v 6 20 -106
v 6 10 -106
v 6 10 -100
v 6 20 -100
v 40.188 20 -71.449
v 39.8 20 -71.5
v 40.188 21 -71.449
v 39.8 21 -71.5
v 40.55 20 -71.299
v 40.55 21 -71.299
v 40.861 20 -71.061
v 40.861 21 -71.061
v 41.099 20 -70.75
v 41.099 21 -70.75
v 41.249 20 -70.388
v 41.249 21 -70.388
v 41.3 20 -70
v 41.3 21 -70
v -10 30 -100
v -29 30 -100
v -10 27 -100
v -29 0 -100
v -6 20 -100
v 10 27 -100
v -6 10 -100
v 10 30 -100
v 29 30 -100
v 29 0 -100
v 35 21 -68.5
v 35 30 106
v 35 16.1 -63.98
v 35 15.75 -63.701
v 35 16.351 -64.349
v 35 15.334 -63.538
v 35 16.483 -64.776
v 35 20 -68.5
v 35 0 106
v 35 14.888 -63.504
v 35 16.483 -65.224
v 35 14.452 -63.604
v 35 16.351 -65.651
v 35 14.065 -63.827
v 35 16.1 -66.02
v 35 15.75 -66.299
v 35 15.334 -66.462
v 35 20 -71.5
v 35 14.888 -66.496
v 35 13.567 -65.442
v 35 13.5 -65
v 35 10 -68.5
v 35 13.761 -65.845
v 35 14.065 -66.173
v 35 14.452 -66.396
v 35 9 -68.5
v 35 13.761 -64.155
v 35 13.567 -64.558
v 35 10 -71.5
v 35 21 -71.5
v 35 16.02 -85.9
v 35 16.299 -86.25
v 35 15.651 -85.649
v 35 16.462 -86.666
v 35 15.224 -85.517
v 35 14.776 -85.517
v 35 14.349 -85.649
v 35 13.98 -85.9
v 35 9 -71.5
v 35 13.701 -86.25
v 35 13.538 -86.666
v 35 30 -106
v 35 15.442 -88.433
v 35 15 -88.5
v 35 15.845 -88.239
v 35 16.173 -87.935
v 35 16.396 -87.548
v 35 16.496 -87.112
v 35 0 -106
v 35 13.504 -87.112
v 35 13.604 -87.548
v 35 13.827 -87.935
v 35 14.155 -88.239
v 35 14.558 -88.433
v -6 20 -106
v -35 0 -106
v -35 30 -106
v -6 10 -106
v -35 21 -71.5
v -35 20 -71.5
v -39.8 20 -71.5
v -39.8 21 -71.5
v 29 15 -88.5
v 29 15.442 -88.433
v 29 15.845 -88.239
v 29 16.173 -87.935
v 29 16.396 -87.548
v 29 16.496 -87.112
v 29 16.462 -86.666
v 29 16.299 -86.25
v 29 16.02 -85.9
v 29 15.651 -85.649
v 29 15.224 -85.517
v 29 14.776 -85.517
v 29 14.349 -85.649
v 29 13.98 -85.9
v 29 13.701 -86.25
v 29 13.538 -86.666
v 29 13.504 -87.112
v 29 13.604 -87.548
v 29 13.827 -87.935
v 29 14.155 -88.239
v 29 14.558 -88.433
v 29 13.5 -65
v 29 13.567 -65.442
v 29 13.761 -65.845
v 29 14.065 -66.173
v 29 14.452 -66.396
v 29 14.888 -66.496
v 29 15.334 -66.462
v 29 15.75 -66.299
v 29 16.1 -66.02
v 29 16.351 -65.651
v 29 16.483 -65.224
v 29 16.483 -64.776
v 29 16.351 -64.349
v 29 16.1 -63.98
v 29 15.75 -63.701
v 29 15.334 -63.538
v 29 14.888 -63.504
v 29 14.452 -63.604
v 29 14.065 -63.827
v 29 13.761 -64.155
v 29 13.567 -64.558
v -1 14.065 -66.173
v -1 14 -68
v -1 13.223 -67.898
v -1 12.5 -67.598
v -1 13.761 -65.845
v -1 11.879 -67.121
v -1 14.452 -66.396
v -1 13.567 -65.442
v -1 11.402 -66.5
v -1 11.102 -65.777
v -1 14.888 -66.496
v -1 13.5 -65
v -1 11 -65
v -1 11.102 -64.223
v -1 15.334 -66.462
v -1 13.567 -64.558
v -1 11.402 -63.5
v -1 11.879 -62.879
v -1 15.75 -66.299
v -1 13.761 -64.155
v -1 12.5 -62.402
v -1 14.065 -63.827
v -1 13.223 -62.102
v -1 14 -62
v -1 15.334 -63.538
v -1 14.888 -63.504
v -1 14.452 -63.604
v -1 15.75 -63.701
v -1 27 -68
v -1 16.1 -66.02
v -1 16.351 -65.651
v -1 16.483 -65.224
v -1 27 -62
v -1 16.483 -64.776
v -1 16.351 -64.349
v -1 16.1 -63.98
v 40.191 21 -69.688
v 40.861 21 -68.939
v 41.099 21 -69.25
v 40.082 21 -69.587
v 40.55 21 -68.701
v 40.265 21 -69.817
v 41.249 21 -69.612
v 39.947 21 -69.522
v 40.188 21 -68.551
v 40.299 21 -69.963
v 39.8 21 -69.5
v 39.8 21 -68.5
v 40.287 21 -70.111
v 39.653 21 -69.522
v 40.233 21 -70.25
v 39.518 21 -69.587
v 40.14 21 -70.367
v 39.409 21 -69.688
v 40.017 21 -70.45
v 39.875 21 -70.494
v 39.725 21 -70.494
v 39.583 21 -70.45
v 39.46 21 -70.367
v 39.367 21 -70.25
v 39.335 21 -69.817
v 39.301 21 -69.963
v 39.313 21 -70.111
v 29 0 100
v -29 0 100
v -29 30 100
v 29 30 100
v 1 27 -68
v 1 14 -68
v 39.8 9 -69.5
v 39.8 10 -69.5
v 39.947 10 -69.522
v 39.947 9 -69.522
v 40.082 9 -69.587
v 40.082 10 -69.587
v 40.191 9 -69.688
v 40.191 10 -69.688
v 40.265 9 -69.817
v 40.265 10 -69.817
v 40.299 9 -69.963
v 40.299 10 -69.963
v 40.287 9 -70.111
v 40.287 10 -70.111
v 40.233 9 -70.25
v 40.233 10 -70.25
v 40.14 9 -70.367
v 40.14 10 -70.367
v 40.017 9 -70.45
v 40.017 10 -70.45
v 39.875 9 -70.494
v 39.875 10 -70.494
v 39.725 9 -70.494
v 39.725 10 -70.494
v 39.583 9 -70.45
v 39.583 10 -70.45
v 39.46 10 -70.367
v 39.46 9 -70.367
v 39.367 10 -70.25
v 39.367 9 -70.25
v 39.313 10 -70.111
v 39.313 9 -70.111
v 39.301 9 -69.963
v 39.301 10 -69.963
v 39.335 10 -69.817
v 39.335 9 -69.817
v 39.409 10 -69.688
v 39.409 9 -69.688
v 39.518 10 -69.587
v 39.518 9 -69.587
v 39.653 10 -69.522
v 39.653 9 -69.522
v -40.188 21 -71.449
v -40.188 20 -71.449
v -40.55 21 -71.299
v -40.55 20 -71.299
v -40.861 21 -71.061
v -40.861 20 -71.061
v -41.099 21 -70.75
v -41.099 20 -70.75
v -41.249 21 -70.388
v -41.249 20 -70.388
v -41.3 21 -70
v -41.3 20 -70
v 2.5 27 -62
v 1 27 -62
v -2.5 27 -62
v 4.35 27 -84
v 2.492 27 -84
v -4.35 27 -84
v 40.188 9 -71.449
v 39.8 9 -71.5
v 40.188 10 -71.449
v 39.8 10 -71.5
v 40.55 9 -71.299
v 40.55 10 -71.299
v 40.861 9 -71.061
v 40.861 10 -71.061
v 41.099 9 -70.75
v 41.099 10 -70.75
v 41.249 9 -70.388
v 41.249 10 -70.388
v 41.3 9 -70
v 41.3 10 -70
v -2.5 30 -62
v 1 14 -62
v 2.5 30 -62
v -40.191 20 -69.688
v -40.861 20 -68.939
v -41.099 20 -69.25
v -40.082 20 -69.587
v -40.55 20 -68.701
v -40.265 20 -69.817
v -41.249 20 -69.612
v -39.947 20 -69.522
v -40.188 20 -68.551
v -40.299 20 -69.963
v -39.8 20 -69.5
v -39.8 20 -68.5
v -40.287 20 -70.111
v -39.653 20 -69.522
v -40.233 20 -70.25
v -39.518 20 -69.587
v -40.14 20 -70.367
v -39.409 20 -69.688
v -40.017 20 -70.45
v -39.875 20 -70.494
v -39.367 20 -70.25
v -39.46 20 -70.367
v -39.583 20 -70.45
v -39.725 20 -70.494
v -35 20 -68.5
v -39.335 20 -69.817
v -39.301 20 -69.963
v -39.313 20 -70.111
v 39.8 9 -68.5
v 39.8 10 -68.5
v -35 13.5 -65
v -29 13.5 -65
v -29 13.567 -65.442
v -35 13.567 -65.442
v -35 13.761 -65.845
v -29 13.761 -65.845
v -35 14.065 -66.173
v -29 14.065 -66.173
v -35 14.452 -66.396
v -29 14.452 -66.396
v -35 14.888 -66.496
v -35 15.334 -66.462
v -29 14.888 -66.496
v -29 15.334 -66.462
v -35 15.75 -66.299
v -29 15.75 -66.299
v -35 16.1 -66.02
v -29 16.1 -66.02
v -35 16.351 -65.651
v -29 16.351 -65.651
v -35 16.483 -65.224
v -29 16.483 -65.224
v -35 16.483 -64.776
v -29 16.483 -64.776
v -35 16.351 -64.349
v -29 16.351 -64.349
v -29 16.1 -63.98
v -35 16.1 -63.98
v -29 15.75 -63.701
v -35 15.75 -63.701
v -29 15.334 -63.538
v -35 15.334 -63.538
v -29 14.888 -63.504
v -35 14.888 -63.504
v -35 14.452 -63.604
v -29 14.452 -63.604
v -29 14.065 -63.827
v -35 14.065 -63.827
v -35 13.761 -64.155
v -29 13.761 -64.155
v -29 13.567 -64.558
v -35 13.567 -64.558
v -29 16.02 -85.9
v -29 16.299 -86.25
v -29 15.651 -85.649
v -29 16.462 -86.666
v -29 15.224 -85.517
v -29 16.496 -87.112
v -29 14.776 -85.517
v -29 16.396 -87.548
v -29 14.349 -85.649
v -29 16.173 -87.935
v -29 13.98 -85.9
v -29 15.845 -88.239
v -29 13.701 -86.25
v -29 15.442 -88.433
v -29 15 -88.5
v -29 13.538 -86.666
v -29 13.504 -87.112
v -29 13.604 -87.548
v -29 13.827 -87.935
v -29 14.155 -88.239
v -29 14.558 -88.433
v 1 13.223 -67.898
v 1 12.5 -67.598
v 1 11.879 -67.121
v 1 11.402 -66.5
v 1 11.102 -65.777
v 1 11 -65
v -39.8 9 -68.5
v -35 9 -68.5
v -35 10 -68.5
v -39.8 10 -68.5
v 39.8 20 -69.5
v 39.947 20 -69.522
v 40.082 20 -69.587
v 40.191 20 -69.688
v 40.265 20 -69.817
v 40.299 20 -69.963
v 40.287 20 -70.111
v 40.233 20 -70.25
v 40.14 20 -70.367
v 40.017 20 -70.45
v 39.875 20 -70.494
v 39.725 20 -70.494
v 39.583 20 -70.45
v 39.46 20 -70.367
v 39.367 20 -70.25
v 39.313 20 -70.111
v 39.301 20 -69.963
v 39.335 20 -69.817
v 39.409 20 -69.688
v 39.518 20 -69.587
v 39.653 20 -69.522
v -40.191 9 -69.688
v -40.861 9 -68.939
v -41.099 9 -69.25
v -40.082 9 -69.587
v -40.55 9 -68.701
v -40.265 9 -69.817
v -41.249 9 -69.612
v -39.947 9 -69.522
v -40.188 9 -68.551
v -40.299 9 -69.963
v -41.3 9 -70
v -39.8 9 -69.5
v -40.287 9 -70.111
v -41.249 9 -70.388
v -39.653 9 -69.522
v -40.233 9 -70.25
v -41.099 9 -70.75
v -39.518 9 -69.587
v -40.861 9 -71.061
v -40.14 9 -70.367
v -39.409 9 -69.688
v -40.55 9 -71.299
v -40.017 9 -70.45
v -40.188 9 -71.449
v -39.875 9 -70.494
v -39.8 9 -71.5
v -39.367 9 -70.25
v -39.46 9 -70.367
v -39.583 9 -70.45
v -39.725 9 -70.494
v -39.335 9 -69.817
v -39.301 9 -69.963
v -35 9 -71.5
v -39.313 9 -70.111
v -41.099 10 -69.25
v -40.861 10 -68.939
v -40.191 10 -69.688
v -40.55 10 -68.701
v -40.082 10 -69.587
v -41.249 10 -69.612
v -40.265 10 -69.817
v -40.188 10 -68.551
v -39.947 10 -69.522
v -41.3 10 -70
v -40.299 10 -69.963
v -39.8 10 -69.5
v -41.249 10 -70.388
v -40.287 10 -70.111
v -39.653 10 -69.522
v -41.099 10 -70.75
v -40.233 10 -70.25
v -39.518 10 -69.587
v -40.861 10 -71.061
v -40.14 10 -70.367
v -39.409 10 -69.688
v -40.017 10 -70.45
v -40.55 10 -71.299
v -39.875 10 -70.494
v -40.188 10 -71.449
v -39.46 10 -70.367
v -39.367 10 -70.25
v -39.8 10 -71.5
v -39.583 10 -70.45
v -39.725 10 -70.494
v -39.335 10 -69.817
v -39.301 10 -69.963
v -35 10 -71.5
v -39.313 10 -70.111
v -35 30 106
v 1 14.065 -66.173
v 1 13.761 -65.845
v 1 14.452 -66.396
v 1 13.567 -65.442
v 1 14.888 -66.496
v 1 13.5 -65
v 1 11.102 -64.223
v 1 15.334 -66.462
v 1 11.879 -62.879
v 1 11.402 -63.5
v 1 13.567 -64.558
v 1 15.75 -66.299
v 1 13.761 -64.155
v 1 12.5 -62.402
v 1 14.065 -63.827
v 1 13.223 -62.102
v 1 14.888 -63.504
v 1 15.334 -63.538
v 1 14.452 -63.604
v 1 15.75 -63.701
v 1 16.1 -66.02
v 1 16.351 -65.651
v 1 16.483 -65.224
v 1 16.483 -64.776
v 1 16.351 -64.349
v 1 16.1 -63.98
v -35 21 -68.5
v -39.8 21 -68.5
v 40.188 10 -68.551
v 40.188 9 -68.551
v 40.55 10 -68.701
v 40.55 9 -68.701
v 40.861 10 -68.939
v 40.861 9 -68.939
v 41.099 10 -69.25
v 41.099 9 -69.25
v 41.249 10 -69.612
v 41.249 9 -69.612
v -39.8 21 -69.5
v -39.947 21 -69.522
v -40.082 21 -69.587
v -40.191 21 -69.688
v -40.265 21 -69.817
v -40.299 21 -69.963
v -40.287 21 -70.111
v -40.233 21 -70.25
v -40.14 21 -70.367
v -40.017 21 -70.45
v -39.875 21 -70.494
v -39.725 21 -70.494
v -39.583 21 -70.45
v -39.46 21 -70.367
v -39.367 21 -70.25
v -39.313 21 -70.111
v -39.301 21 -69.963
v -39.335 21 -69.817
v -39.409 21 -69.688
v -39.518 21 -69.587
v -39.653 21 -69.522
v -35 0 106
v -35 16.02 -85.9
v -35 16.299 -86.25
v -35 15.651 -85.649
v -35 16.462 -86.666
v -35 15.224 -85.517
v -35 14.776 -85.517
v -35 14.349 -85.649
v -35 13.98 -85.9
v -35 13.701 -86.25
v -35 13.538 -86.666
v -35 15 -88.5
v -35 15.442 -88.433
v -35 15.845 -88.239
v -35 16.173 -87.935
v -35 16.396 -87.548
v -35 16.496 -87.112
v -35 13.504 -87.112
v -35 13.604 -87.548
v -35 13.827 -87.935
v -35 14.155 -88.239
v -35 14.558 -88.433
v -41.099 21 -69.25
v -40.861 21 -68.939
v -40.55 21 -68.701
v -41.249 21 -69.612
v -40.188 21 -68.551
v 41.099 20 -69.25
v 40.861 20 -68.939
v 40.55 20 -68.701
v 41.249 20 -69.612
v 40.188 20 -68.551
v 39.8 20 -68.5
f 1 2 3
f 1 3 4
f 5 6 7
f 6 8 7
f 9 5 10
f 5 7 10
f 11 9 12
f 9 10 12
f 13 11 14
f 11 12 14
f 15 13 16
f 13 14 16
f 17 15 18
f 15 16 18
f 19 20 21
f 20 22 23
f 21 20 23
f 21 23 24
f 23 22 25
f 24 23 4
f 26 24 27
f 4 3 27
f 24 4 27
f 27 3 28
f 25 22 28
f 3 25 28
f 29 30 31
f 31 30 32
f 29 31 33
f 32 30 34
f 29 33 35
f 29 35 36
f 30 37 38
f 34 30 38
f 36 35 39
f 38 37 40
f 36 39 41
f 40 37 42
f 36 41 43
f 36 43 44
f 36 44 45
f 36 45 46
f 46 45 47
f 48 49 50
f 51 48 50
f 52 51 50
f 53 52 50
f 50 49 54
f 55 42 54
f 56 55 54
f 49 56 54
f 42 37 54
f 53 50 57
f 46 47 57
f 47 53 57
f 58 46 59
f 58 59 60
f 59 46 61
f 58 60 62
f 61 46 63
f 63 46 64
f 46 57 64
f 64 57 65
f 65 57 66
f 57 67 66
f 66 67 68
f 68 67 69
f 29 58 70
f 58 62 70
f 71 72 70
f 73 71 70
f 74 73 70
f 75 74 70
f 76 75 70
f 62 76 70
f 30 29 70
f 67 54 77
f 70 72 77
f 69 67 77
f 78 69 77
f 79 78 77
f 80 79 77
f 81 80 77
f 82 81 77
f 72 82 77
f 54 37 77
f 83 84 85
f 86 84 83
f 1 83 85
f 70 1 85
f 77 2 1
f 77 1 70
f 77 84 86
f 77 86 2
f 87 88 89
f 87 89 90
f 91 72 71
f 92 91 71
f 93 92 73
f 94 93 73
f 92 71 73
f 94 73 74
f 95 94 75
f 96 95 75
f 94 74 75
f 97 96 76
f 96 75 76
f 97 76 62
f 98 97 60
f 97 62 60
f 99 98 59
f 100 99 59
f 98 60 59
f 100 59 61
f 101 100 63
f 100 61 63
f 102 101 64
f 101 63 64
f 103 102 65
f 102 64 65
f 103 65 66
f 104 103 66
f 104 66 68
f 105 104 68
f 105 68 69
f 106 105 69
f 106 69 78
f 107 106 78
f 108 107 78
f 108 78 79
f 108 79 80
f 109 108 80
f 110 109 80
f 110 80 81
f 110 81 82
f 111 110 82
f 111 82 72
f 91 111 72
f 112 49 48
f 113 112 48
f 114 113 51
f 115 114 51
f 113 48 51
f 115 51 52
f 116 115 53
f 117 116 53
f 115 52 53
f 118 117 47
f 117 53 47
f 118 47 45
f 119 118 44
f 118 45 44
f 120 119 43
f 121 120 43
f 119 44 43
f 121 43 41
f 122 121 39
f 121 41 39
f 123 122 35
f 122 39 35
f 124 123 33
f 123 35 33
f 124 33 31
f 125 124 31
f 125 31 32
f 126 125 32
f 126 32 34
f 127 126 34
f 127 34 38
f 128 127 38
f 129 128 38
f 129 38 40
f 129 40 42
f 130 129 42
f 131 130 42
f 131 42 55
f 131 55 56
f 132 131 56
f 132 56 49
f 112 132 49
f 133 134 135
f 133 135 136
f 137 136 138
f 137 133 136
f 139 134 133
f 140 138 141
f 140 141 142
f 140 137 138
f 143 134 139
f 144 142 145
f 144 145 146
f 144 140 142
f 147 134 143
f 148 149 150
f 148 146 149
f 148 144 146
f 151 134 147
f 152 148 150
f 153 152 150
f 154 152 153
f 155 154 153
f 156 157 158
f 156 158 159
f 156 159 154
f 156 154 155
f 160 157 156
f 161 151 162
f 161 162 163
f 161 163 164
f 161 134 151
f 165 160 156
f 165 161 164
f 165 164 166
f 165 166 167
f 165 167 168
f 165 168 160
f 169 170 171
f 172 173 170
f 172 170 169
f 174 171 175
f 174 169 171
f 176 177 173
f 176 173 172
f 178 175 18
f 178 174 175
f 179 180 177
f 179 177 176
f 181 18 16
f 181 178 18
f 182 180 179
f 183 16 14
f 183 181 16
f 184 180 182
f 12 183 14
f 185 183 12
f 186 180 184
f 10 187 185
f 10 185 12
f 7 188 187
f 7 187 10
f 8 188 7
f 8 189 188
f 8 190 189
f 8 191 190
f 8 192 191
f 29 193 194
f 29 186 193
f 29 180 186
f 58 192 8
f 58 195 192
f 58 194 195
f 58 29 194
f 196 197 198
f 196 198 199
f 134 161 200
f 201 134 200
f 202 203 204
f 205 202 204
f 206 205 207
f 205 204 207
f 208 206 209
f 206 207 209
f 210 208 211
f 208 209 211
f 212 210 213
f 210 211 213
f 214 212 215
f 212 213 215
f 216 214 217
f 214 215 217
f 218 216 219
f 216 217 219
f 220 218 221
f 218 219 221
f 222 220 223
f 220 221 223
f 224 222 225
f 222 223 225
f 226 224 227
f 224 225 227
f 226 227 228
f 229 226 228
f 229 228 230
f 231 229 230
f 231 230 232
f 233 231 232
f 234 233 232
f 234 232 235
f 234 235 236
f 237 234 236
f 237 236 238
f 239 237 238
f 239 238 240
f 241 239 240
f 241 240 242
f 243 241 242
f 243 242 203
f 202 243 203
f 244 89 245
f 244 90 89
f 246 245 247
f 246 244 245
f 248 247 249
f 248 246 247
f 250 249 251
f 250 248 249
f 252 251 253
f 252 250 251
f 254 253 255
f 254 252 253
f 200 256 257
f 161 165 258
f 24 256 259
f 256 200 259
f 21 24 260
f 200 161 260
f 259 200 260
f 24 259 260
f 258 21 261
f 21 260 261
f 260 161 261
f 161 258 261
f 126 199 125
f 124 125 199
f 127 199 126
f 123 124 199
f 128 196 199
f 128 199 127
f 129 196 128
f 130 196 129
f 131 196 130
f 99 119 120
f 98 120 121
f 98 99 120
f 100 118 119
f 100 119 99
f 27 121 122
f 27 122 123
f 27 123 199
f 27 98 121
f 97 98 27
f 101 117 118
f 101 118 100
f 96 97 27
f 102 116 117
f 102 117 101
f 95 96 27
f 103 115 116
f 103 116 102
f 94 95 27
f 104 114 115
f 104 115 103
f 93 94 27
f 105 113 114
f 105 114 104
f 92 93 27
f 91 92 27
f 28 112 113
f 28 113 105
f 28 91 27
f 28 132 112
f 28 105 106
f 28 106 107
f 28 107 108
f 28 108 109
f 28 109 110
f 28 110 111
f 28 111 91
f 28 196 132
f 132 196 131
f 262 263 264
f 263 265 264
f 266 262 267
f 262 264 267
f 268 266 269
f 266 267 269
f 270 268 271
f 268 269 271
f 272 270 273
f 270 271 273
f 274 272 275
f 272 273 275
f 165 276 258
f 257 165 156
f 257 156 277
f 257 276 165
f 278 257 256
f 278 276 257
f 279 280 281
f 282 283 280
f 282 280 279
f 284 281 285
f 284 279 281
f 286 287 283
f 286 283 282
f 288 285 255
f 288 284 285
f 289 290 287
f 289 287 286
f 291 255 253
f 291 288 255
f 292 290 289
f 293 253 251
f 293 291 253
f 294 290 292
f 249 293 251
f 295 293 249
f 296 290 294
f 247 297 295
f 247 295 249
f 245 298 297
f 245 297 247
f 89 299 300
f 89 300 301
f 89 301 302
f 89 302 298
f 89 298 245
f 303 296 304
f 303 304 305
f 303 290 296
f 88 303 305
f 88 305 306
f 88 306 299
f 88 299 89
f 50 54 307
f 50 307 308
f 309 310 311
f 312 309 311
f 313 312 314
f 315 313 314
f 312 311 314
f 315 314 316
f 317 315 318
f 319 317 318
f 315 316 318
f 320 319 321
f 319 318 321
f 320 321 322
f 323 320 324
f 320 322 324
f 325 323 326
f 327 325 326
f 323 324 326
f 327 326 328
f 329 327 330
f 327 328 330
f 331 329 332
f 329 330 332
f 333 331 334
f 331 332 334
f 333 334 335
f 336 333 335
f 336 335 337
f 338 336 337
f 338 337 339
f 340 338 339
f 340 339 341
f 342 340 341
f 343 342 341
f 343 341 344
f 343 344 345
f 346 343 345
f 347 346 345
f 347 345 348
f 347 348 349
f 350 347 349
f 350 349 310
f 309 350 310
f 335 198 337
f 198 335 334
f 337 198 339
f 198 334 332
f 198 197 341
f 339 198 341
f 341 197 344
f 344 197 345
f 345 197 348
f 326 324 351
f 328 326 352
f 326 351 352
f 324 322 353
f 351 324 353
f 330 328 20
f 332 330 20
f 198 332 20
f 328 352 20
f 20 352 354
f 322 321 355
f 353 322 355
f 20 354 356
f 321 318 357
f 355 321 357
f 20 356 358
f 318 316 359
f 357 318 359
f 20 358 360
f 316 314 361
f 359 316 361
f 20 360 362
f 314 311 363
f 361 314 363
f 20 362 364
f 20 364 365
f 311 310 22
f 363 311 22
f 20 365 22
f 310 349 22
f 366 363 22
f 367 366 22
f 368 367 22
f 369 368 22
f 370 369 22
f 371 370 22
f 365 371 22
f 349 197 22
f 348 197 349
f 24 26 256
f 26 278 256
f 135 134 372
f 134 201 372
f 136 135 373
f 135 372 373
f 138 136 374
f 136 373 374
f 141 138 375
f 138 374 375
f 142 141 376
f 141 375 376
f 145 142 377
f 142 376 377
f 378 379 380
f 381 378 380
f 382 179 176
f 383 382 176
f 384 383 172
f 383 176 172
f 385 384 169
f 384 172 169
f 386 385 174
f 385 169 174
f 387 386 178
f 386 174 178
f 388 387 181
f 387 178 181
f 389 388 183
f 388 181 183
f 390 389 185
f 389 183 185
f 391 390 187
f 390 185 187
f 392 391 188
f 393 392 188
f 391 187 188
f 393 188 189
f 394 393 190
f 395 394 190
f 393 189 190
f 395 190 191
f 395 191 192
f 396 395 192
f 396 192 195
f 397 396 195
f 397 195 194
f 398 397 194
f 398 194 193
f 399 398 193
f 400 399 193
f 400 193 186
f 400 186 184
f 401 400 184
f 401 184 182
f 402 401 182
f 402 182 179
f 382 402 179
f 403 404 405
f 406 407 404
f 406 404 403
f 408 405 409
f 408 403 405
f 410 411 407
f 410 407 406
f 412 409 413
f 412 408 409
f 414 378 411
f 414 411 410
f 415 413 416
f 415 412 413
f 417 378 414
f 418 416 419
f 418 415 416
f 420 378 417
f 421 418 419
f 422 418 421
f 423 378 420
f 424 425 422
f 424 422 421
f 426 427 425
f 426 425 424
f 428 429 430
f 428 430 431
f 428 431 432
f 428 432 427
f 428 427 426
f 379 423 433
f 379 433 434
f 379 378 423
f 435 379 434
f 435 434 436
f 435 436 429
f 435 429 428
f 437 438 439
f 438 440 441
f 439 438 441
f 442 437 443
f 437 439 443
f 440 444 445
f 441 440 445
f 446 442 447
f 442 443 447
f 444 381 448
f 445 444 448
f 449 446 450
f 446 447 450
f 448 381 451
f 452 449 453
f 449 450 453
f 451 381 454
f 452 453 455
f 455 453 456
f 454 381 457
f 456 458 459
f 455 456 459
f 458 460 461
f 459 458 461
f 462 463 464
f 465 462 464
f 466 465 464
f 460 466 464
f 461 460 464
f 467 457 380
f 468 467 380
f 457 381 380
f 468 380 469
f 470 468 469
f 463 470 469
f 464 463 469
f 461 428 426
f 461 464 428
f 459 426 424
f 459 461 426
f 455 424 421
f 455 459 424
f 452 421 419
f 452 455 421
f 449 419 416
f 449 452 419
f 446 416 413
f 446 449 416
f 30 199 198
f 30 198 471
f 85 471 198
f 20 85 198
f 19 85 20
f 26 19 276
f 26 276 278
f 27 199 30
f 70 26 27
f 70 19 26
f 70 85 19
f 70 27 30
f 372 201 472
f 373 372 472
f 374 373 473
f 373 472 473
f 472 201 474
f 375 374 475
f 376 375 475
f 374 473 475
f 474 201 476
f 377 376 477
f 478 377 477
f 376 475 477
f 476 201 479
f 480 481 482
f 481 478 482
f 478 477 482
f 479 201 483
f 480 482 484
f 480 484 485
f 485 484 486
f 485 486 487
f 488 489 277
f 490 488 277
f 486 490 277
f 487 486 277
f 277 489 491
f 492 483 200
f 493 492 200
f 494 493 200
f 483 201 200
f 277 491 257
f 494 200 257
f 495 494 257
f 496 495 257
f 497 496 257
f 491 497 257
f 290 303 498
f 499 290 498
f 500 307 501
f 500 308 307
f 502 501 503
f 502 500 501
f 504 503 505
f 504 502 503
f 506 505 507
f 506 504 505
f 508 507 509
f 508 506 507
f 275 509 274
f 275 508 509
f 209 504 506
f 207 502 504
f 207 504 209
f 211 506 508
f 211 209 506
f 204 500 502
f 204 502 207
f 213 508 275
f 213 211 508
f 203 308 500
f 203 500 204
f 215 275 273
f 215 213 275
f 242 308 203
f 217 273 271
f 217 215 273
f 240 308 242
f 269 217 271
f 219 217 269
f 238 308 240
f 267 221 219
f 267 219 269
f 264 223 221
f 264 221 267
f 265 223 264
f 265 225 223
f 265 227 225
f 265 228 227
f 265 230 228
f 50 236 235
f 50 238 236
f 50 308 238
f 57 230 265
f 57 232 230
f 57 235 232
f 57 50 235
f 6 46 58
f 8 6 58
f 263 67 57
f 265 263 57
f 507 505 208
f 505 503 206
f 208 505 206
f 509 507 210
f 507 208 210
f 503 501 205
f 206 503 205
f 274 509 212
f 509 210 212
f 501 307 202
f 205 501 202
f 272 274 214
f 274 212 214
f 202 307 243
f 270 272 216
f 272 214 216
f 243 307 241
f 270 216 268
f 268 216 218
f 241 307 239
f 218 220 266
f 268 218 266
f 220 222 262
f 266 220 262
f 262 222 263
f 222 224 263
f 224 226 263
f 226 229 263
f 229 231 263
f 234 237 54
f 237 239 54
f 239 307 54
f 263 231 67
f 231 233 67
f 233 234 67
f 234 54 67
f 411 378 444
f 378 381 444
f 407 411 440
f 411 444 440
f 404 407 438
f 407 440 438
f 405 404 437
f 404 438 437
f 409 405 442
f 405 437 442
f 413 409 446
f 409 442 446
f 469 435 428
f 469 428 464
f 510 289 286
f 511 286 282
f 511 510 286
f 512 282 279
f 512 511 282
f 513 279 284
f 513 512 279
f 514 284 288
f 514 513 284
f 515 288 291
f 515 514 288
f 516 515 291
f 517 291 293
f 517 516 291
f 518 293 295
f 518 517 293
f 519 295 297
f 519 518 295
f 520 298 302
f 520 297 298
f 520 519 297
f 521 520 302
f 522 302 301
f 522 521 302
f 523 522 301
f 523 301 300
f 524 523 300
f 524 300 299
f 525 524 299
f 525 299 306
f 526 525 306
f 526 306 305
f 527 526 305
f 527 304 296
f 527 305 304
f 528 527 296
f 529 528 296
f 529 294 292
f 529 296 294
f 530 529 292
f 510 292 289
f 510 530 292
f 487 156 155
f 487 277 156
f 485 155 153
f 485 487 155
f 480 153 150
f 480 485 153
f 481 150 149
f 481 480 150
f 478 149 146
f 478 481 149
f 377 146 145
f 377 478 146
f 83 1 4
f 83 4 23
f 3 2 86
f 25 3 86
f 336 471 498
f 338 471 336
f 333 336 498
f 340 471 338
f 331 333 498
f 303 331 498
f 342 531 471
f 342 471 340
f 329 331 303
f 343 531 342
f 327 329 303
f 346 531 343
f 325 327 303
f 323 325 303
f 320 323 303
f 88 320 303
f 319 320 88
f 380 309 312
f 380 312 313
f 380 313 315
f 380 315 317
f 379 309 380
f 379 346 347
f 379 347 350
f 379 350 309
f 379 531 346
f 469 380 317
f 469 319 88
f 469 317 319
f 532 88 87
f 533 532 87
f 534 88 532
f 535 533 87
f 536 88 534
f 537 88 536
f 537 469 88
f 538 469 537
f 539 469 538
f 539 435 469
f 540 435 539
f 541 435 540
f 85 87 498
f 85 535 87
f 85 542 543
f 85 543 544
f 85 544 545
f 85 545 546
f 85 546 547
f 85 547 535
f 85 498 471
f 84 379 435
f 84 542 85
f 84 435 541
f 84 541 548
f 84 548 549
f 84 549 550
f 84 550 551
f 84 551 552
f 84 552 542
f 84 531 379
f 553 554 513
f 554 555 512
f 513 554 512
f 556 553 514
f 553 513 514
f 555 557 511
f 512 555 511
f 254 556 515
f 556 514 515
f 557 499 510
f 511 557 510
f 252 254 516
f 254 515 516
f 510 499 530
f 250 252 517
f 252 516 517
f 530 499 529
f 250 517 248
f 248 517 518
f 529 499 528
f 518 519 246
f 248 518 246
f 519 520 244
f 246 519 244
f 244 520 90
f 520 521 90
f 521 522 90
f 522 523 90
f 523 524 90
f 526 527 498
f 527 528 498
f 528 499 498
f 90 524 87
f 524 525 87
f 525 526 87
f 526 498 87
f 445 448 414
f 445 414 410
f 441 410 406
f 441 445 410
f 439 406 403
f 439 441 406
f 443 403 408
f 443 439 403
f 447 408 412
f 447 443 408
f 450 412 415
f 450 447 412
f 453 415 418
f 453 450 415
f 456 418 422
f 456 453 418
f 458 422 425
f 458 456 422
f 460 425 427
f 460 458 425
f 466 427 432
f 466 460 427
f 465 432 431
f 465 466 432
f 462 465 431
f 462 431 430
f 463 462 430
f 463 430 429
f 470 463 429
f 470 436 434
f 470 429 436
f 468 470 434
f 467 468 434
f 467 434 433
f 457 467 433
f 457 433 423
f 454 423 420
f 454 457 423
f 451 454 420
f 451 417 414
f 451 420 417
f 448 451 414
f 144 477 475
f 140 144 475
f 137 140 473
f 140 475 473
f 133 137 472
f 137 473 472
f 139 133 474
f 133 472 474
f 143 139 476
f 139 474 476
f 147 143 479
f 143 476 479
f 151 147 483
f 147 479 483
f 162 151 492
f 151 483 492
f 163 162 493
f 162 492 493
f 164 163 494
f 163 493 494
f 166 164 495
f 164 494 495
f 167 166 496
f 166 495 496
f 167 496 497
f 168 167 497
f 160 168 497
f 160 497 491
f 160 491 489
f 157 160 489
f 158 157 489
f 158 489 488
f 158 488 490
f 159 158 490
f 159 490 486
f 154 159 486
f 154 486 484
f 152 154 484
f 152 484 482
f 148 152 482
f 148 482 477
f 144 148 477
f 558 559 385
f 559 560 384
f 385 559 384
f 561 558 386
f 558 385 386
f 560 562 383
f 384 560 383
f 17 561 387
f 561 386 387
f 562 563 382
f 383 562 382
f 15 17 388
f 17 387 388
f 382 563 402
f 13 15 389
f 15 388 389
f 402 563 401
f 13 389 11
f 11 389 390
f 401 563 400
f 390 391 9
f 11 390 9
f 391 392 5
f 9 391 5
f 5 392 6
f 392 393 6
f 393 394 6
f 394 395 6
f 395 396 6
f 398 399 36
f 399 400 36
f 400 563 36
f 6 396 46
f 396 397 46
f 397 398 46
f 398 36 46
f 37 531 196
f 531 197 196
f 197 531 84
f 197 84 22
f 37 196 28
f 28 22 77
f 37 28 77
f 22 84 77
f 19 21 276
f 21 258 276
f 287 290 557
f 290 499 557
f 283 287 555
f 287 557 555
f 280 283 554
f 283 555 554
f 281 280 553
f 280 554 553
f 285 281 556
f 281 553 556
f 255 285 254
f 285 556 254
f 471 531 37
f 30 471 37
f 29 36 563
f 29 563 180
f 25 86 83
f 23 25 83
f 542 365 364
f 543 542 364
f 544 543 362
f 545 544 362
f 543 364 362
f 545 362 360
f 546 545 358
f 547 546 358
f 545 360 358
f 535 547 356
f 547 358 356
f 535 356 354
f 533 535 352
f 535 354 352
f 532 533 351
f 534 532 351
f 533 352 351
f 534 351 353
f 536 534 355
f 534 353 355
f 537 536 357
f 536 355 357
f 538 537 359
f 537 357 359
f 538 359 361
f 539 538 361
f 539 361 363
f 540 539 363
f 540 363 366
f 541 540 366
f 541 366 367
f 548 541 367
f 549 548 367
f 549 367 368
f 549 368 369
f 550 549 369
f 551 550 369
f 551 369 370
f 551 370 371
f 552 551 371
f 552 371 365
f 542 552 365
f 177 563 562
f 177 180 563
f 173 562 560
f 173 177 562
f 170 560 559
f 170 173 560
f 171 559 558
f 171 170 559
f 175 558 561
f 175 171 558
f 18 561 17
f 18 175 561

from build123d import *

# Parameters (mm, degrees)
SKETCH1_W            = 70
SKETCH1_H            = 212
SKETCH1_W_2          = 58
SKETCH1_H_2          = 200
BOSS_EXTRUDE1_DEPTH  = 30
SKETCH10_W           = 2
SKETCH10_H           = 6
BOSS_EXTRUDE3_DEPTH  = 16
FILLET2_R            = 3
SKETCH2_R            = 1.5
CUT_EXTRUDE1_DEPTH   = 131.52202895
CUT_EXTRUDE2_REACH   = 218.954
SKETCH3_W            = 12
SKETCH3_H            = 10
SKETCH11_W           = 3
SKETCH11_H           = 1
BOSS_EXTRUDE4_DEPTH  = 6.3
FILLET3_R            = 1.5
SKETCH12_R           = 0.5
CUT_EXTRUDE3_DEPTH   = 116.683577146
FILLET3_OF_MIRROR1_R = 1.5


with BuildPart() as part:
    # Sketch1 → Boss-Extrude1 (new body)
    with BuildSketch(Plane(origin=(0, 0, 0), x_dir=(1, 0, 0), z_dir=(0, 1, 0))):
        Rectangle(SKETCH1_W, SKETCH1_H)
        Rectangle(SKETCH1_W_2, SKETCH1_H_2, mode=Mode.SUBTRACT)
    extrude(amount=BOSS_EXTRUDE1_DEPTH)

    # Sketch7 → Loft3 section 0
    with BuildSketch(Plane.XY.offset(-100)):
        with BuildLine():
            Line((-10, 30), (10, 30))
            Line((10, 30), (10, 27))
            Line((10, 27), (-10, 27))
            Line((-10, 27), (-10, 30))
        make_face()
    # Sketch8 → Loft3 section 1
    with BuildSketch(Plane.XY.offset(-62)):
        with BuildLine():
            Line((-2.5, 30), (2.5, 30))
            Line((2.5, 30), (2.5, 27))
            Line((2.5, 27), (-2.5, 27))
            Line((-2.5, 27), (-2.5, 30))
        make_face()
    loft()

    # Sketch10 → Boss-Extrude3 (add)
    with BuildSketch(Plane.XZ.offset(-27)):
        with Locations((0, -65)):
            Rectangle(SKETCH10_W, SKETCH10_H)
    extrude(amount=BOSS_EXTRUDE3_DEPTH)

    # Fillet2
    fillet2_edges = [part.edges().sort_by_distance(p)[0] for p in [
        (0, 11, -68),
        (0, 11, -62),
    ]]
    fillet(fillet2_edges, radius=FILLET2_R - 0.0001)  # a hair under: the kernel refuses the full size

    # Sketch2 → Cut-Extrude1 (cut, through all)
    with BuildSketch(Plane(origin=(35, 0, 0), x_dir=(0, 0, -1), z_dir=(1, 0, 0))):
        with Locations(Location((65, 15, 0), (0, 0, 270))):
            Circle(SKETCH2_R)
        with Locations((87, 15)):
            Circle(SKETCH2_R)
    extrude(amount=-CUT_EXTRUDE1_DEPTH, mode=Mode.SUBTRACT)

    # Sketch3 → Cut-Extrude2 (cut, up to next)
    with BuildSketch(Plane(origin=(0, 0, -106), x_dir=(-1, 0, 0), z_dir=(0, 0, -1)), mode=Mode.PRIVATE) as cut_extrude2_sk1:
        with Locations((0, 15)):
            Rectangle(SKETCH3_W, SKETCH3_H)
    cut_extrude2_tool1 = extrude(cut_extrude2_sk1.sketch, amount=-CUT_EXTRUDE2_REACH, mode=Mode.PRIVATE) & part.part
    add(cut_extrude2_tool1.solids().sort_by_distance((0, 15, -106))[0], mode=Mode.SUBTRACT)

    # Sketch11 → Boss-Extrude4 (add)
    with BuildSketch(Plane(origin=(35, 0, 0), x_dir=(0, 0, -1), z_dir=(1, 0, 0))):
        with Locations((70, 20.5)):
            Rectangle(SKETCH11_W, SKETCH11_H)
        with Locations((70, 9.5)):
            Rectangle(SKETCH11_W, SKETCH11_H)
    boss_extrude4 = extrude(amount=BOSS_EXTRUDE4_DEPTH)

    # Fillet3
    fillet3_edges = [part.edges().sort_by_distance(p)[0] for p in [
        (41.3, 9.5, -68.5),
        (41.3, 9.5, -71.5),
        (41.3, 20.5, -68.5),
        (41.3, 20.5, -71.5),
    ]]
    fillet(fillet3_edges, radius=FILLET3_R - 0.0001)  # a hair under: the kernel refuses the full size

    # Sketch12 → Cut-Extrude3 (cut, through all)
    with BuildSketch(Plane(origin=(0, 21, 0), x_dir=(1, 0, 0), z_dir=(0, 1, 0))):
        with Locations(Location((39.8, 70, 0), (0, 0, 270))):
            Circle(SKETCH12_R)
    cut_extrude3 = extrude(amount=-CUT_EXTRUDE3_DEPTH, mode=Mode.SUBTRACT)

    # Mirror1: Boss-Extrude4, Cut-Extrude3 across plane
    add(boss_extrude4.mirror(Plane(origin=(0, 0, 0), x_dir=(0, 0, 1), z_dir=(1, 0, 0))))
    add(cut_extrude3.mirror(Plane(origin=(0, 0, 0), x_dir=(0, 0, 1), z_dir=(1, 0, 0))), mode=Mode.SUBTRACT)

    # Fillet3 of Mirror1
    fillet3_of_mirror1_edges = [part.edges().sort_by_distance(p)[0] for p in [
        (-41.3, 9.5, -68.5),
        (-41.3, 9.5, -71.5),
        (-41.3, 20.5, -68.5),
        (-41.3, 20.5, -71.5),
    ]]
    fillet(fillet3_of_mirror1_edges, radius=FILLET3_OF_MIRROR1_R - 0.0001)  # a hair under: the kernel refuses the full size


solid = part.part
